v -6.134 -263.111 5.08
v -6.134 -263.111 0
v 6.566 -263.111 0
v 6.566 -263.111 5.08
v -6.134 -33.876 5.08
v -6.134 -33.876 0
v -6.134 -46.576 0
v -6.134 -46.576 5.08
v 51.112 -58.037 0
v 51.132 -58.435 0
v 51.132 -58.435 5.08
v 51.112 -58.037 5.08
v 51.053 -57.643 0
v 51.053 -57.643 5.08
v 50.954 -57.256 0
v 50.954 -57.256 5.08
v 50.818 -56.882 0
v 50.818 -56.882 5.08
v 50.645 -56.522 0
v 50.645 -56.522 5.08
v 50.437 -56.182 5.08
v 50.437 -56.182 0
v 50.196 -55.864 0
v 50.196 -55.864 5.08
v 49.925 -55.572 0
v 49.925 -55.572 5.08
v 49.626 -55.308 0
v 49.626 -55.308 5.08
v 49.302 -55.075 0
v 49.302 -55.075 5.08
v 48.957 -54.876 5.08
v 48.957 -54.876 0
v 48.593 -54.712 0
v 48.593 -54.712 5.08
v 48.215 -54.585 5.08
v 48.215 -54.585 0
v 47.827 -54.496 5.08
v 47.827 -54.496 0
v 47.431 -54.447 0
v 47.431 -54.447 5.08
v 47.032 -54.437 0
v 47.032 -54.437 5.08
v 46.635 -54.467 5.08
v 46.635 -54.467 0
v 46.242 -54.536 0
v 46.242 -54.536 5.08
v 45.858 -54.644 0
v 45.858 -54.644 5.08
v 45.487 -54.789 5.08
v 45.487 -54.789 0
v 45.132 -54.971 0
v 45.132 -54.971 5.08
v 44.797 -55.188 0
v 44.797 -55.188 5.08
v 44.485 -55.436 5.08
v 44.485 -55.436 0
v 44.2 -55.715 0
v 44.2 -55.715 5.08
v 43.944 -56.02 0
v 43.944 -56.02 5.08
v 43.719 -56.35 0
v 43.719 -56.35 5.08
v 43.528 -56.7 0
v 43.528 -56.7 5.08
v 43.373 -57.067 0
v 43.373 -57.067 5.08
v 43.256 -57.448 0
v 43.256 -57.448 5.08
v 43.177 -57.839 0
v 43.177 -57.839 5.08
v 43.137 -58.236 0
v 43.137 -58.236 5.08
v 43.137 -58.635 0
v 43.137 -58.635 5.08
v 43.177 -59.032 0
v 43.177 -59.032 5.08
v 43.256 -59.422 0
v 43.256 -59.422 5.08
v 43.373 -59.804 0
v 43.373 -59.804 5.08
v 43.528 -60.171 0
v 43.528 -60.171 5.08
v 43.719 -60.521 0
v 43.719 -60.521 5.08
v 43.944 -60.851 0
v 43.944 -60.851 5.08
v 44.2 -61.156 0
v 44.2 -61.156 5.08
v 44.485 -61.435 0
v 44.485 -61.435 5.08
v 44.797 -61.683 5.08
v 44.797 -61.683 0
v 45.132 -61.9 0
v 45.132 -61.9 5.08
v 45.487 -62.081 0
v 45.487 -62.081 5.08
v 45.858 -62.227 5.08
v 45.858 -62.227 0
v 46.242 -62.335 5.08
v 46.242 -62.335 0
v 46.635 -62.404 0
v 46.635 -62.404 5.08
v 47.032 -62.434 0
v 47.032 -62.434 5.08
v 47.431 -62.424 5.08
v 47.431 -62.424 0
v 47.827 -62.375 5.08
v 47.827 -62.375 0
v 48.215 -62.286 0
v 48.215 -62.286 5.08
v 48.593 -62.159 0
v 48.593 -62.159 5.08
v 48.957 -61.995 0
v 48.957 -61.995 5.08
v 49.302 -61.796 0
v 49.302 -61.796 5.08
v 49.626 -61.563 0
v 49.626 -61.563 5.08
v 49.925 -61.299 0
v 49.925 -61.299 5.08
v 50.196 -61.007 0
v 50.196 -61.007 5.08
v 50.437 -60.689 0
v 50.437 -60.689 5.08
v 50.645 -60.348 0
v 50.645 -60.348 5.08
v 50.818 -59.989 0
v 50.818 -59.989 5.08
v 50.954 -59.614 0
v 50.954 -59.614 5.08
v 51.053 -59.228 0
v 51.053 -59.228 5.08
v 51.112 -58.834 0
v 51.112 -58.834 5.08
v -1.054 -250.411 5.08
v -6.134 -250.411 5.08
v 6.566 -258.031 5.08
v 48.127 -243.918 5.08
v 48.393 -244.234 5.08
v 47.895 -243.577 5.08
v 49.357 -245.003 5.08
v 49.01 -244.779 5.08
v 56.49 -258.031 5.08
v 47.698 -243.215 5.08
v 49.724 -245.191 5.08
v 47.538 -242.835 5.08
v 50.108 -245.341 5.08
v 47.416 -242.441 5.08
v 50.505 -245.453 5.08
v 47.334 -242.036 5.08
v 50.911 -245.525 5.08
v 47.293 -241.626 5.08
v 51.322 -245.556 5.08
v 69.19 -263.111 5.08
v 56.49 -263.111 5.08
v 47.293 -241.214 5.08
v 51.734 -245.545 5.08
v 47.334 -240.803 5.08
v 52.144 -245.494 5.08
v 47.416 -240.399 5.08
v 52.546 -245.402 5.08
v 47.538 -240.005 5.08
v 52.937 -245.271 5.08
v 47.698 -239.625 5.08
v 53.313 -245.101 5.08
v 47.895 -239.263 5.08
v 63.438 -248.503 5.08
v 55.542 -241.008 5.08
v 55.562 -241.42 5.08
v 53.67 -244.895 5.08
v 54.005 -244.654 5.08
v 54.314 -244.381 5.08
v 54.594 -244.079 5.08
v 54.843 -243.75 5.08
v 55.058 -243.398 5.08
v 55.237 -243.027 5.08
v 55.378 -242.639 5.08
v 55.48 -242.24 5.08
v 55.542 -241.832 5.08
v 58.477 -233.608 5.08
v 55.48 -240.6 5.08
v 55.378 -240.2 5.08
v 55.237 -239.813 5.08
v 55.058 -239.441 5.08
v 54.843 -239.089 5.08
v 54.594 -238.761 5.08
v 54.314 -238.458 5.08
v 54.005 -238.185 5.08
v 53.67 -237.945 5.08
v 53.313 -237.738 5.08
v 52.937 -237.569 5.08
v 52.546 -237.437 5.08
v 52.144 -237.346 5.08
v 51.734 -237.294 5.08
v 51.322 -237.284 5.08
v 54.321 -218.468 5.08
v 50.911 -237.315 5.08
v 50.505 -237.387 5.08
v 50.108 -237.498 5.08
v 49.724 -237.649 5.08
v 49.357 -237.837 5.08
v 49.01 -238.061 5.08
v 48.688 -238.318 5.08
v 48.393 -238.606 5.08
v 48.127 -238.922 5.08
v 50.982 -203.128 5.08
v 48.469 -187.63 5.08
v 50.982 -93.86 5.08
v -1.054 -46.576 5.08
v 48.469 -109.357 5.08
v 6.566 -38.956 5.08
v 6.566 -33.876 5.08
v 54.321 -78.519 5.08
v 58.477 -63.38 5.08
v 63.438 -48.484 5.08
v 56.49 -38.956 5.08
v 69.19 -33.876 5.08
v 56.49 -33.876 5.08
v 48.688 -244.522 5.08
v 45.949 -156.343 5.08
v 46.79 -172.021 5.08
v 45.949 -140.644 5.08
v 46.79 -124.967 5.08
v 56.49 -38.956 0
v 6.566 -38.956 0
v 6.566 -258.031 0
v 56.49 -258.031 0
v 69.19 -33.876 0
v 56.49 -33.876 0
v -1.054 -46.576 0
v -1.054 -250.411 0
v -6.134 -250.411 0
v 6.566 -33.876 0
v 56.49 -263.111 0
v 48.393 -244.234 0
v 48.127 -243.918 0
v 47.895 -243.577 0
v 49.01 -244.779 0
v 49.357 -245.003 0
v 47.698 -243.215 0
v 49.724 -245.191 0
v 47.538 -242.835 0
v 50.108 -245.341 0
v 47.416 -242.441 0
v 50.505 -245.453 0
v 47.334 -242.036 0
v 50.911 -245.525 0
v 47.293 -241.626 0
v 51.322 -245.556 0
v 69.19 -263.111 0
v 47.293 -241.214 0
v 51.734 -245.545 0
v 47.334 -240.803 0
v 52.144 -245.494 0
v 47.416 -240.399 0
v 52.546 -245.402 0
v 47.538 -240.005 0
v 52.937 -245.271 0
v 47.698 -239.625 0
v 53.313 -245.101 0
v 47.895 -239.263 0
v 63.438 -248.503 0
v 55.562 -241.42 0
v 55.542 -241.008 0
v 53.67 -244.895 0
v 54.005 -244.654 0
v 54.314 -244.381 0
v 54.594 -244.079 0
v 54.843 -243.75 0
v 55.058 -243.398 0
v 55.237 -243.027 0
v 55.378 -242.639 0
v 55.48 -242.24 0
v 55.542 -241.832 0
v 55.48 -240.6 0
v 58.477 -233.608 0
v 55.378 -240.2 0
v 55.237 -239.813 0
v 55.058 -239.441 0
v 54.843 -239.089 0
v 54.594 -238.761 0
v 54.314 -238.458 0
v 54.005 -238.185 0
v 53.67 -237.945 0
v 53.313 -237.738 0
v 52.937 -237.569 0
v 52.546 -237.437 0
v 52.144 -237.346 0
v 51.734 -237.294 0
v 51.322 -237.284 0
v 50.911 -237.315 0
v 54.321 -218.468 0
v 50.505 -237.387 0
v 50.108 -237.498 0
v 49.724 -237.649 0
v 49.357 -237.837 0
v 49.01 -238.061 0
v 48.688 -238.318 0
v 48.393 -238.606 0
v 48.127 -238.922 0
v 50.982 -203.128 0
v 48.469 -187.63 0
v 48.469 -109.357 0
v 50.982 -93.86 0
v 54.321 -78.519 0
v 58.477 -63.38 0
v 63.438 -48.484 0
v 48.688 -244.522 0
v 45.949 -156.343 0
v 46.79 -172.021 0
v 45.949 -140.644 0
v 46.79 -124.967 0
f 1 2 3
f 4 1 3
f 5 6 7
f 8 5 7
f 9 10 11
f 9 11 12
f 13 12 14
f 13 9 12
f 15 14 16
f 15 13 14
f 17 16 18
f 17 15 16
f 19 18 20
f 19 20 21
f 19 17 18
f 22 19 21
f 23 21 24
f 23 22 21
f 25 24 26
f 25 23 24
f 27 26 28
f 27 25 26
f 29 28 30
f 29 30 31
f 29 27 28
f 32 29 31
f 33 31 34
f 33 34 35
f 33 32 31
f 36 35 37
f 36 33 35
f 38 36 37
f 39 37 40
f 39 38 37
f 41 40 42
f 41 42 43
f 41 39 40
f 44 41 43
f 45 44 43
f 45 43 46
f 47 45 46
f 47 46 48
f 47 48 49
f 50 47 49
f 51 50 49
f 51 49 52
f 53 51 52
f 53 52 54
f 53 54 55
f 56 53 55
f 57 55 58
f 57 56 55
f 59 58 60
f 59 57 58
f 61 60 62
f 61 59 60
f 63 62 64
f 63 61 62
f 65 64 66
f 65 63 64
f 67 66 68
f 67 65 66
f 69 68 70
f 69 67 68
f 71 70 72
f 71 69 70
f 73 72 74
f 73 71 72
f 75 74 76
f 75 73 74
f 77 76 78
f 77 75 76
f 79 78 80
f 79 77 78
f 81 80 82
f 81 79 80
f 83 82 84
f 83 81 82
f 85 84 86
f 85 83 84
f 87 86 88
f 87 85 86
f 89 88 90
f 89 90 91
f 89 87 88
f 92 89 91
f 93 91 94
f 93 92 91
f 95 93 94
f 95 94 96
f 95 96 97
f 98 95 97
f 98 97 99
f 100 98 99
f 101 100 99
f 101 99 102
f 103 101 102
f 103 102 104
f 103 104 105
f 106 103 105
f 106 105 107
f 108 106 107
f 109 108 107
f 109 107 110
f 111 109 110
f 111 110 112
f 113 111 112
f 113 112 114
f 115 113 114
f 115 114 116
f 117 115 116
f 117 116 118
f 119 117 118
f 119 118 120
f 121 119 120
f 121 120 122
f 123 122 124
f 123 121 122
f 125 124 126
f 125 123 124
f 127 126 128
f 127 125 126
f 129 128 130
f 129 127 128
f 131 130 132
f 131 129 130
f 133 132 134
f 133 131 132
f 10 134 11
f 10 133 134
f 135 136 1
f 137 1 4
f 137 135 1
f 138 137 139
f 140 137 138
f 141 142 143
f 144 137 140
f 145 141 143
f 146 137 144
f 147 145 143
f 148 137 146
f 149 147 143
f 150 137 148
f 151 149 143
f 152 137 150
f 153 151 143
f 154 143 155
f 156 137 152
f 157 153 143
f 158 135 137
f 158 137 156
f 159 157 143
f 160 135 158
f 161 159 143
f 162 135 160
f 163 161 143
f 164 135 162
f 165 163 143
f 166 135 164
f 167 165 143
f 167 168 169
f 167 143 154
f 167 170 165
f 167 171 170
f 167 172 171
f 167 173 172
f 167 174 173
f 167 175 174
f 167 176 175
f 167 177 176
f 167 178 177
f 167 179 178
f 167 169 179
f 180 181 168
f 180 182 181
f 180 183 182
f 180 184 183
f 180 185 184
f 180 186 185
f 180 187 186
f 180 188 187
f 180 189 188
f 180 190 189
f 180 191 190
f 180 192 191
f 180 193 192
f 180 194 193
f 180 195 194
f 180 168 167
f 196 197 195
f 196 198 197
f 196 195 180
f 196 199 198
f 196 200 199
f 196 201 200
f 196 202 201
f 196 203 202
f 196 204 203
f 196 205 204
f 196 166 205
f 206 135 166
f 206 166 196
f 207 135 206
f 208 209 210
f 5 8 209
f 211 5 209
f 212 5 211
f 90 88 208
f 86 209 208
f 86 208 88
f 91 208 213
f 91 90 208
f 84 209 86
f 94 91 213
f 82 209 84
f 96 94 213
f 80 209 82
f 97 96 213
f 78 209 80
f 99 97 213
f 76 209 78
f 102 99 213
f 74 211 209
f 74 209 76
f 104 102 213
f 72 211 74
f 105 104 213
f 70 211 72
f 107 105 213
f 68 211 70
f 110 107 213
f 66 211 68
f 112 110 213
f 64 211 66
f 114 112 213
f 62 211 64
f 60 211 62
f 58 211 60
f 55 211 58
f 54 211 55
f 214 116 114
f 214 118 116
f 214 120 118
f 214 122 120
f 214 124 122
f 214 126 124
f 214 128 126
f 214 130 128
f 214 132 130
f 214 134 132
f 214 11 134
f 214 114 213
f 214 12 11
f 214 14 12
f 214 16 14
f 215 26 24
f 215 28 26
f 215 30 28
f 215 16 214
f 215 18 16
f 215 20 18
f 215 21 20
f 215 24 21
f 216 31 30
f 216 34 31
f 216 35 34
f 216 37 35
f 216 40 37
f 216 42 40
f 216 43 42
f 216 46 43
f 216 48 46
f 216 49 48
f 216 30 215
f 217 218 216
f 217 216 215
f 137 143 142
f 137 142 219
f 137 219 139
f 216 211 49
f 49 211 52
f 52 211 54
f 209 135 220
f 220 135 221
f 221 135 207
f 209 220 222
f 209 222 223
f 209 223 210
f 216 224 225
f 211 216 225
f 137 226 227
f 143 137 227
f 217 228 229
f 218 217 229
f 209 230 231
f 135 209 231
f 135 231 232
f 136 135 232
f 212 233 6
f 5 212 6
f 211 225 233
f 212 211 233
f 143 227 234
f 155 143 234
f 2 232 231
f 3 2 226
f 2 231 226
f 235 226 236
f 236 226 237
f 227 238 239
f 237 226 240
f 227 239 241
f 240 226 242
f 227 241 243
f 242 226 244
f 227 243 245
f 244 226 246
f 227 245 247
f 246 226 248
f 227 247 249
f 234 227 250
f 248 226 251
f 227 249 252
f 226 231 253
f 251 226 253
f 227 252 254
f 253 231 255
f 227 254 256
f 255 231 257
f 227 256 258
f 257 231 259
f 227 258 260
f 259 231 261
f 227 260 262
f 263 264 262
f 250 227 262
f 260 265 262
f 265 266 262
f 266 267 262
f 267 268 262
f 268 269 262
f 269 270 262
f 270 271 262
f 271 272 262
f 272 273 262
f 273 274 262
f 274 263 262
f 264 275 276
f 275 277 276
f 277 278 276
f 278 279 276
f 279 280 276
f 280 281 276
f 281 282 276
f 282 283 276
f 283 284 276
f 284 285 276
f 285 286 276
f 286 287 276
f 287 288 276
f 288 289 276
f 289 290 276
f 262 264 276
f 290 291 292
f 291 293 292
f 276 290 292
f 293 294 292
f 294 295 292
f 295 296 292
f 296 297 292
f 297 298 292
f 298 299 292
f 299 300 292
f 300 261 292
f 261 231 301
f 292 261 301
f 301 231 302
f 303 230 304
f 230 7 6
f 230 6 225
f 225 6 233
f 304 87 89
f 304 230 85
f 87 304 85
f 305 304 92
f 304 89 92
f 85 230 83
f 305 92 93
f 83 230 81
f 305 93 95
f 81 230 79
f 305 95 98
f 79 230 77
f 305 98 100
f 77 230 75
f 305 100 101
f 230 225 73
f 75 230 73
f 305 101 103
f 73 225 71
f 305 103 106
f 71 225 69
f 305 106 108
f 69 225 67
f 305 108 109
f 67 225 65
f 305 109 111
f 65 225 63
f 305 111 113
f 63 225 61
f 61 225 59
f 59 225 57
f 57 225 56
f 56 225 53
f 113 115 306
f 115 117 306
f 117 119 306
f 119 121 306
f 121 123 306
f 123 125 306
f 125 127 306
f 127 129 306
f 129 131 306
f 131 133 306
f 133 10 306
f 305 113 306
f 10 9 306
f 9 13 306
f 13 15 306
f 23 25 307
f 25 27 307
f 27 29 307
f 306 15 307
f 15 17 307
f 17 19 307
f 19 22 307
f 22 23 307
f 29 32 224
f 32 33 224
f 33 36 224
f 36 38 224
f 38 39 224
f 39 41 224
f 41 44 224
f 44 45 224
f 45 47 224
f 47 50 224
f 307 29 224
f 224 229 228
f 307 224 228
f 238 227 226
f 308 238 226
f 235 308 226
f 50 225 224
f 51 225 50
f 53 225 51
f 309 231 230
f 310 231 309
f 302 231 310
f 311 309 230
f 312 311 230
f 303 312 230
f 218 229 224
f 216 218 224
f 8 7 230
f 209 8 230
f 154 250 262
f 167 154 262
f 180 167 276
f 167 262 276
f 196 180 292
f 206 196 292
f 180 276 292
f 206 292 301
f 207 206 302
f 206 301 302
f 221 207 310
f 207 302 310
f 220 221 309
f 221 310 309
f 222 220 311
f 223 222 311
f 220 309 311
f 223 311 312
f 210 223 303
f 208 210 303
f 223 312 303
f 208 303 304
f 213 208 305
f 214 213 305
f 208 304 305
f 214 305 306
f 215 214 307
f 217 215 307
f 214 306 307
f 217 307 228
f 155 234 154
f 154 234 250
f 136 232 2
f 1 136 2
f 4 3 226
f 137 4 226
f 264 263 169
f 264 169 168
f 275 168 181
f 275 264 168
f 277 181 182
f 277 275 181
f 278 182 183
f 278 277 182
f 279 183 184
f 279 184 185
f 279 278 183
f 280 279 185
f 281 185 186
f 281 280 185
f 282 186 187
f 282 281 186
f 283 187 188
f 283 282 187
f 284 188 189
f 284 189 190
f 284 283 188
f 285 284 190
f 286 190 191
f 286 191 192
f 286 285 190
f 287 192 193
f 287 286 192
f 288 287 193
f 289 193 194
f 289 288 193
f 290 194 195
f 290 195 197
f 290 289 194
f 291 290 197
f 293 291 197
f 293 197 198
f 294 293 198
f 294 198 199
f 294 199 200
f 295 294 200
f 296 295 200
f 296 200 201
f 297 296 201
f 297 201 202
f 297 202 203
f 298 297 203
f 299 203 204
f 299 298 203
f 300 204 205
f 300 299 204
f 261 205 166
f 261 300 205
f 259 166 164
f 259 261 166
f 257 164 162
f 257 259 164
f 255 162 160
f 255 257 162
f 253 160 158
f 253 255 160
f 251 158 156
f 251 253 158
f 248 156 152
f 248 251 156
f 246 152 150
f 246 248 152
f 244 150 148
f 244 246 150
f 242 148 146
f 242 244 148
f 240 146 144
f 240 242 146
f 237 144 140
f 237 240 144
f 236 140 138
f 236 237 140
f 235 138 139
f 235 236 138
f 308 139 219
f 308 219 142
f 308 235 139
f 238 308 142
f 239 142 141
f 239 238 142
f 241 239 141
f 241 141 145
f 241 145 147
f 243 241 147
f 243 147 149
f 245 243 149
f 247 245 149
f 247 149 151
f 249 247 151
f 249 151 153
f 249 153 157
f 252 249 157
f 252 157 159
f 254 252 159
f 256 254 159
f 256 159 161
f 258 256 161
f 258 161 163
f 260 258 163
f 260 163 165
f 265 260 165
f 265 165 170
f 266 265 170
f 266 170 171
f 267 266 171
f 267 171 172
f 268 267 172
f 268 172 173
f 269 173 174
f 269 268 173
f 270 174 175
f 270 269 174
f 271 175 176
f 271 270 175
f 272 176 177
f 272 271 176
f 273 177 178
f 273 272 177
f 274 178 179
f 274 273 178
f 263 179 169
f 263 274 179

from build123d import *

# Parameters (mm, degrees)
SKETCH1_R           = 4.136999592
SKETCH1_R_2         = 4
BOSS_EXTRUDE1_DEPTH = 5.08


with BuildPart() as part:
    # Sketch1 → Boss-Extrude1 (new body)
    with BuildSketch(Plane.XY):
        with BuildLine():
            Line((-1.053755041, -250.411017633), (-6.133755041, -250.411017633))
            Line((-6.133755041, -250.411017633), (-6.133755041, -263.111017633))
            Line((-6.133755041, -263.111017633), (6.566244959, -263.111017633))
            Line((6.566244959, -263.111017633), (6.566244959, -258.031017633))
            Line((6.566244959, -258.031017633), (56.490143771, -258.031017633))
            Line((56.490143771, -258.031017633), (56.490143771, -263.111017633))
            Line((56.490143771, -263.111017633), (69.190143771, -263.111017633))
            ThreePointArc((69.190143771, -263.111017633), (45.84381153, -148.493633523), (69.190143771, -33.876249413))
            Line((69.190143771, -33.876249413), (56.490143771, -33.876249413))
            Line((56.490143771, -33.876249413), (56.490143771, -38.956249413))
            Line((56.490143771, -38.956249413), (6.566244959, -38.956249413))
            Line((6.566244959, -38.956249413), (6.566244959, -33.876249413))
            Line((6.566244959, -33.876249413), (-6.133755041, -33.876249413))
            Line((-6.133755041, -33.876249413), (-6.133755041, -46.576249413))
            Line((-6.133755041, -46.576249413), (-1.053755041, -46.576249413))
            Line((-1.053755041, -46.576249413), (-1.053755041, -250.411017633))
        make_face()
        with Locations((51.42519067, -241.419788328)):
            Circle(SKETCH1_R, mode=Mode.SUBTRACT)
        with Locations((47.132064803, -58.435465331)):
            Circle(SKETCH1_R_2, mode=Mode.SUBTRACT)
    extrude(amount=BOSS_EXTRUDE1_DEPTH)


solid = part.part
